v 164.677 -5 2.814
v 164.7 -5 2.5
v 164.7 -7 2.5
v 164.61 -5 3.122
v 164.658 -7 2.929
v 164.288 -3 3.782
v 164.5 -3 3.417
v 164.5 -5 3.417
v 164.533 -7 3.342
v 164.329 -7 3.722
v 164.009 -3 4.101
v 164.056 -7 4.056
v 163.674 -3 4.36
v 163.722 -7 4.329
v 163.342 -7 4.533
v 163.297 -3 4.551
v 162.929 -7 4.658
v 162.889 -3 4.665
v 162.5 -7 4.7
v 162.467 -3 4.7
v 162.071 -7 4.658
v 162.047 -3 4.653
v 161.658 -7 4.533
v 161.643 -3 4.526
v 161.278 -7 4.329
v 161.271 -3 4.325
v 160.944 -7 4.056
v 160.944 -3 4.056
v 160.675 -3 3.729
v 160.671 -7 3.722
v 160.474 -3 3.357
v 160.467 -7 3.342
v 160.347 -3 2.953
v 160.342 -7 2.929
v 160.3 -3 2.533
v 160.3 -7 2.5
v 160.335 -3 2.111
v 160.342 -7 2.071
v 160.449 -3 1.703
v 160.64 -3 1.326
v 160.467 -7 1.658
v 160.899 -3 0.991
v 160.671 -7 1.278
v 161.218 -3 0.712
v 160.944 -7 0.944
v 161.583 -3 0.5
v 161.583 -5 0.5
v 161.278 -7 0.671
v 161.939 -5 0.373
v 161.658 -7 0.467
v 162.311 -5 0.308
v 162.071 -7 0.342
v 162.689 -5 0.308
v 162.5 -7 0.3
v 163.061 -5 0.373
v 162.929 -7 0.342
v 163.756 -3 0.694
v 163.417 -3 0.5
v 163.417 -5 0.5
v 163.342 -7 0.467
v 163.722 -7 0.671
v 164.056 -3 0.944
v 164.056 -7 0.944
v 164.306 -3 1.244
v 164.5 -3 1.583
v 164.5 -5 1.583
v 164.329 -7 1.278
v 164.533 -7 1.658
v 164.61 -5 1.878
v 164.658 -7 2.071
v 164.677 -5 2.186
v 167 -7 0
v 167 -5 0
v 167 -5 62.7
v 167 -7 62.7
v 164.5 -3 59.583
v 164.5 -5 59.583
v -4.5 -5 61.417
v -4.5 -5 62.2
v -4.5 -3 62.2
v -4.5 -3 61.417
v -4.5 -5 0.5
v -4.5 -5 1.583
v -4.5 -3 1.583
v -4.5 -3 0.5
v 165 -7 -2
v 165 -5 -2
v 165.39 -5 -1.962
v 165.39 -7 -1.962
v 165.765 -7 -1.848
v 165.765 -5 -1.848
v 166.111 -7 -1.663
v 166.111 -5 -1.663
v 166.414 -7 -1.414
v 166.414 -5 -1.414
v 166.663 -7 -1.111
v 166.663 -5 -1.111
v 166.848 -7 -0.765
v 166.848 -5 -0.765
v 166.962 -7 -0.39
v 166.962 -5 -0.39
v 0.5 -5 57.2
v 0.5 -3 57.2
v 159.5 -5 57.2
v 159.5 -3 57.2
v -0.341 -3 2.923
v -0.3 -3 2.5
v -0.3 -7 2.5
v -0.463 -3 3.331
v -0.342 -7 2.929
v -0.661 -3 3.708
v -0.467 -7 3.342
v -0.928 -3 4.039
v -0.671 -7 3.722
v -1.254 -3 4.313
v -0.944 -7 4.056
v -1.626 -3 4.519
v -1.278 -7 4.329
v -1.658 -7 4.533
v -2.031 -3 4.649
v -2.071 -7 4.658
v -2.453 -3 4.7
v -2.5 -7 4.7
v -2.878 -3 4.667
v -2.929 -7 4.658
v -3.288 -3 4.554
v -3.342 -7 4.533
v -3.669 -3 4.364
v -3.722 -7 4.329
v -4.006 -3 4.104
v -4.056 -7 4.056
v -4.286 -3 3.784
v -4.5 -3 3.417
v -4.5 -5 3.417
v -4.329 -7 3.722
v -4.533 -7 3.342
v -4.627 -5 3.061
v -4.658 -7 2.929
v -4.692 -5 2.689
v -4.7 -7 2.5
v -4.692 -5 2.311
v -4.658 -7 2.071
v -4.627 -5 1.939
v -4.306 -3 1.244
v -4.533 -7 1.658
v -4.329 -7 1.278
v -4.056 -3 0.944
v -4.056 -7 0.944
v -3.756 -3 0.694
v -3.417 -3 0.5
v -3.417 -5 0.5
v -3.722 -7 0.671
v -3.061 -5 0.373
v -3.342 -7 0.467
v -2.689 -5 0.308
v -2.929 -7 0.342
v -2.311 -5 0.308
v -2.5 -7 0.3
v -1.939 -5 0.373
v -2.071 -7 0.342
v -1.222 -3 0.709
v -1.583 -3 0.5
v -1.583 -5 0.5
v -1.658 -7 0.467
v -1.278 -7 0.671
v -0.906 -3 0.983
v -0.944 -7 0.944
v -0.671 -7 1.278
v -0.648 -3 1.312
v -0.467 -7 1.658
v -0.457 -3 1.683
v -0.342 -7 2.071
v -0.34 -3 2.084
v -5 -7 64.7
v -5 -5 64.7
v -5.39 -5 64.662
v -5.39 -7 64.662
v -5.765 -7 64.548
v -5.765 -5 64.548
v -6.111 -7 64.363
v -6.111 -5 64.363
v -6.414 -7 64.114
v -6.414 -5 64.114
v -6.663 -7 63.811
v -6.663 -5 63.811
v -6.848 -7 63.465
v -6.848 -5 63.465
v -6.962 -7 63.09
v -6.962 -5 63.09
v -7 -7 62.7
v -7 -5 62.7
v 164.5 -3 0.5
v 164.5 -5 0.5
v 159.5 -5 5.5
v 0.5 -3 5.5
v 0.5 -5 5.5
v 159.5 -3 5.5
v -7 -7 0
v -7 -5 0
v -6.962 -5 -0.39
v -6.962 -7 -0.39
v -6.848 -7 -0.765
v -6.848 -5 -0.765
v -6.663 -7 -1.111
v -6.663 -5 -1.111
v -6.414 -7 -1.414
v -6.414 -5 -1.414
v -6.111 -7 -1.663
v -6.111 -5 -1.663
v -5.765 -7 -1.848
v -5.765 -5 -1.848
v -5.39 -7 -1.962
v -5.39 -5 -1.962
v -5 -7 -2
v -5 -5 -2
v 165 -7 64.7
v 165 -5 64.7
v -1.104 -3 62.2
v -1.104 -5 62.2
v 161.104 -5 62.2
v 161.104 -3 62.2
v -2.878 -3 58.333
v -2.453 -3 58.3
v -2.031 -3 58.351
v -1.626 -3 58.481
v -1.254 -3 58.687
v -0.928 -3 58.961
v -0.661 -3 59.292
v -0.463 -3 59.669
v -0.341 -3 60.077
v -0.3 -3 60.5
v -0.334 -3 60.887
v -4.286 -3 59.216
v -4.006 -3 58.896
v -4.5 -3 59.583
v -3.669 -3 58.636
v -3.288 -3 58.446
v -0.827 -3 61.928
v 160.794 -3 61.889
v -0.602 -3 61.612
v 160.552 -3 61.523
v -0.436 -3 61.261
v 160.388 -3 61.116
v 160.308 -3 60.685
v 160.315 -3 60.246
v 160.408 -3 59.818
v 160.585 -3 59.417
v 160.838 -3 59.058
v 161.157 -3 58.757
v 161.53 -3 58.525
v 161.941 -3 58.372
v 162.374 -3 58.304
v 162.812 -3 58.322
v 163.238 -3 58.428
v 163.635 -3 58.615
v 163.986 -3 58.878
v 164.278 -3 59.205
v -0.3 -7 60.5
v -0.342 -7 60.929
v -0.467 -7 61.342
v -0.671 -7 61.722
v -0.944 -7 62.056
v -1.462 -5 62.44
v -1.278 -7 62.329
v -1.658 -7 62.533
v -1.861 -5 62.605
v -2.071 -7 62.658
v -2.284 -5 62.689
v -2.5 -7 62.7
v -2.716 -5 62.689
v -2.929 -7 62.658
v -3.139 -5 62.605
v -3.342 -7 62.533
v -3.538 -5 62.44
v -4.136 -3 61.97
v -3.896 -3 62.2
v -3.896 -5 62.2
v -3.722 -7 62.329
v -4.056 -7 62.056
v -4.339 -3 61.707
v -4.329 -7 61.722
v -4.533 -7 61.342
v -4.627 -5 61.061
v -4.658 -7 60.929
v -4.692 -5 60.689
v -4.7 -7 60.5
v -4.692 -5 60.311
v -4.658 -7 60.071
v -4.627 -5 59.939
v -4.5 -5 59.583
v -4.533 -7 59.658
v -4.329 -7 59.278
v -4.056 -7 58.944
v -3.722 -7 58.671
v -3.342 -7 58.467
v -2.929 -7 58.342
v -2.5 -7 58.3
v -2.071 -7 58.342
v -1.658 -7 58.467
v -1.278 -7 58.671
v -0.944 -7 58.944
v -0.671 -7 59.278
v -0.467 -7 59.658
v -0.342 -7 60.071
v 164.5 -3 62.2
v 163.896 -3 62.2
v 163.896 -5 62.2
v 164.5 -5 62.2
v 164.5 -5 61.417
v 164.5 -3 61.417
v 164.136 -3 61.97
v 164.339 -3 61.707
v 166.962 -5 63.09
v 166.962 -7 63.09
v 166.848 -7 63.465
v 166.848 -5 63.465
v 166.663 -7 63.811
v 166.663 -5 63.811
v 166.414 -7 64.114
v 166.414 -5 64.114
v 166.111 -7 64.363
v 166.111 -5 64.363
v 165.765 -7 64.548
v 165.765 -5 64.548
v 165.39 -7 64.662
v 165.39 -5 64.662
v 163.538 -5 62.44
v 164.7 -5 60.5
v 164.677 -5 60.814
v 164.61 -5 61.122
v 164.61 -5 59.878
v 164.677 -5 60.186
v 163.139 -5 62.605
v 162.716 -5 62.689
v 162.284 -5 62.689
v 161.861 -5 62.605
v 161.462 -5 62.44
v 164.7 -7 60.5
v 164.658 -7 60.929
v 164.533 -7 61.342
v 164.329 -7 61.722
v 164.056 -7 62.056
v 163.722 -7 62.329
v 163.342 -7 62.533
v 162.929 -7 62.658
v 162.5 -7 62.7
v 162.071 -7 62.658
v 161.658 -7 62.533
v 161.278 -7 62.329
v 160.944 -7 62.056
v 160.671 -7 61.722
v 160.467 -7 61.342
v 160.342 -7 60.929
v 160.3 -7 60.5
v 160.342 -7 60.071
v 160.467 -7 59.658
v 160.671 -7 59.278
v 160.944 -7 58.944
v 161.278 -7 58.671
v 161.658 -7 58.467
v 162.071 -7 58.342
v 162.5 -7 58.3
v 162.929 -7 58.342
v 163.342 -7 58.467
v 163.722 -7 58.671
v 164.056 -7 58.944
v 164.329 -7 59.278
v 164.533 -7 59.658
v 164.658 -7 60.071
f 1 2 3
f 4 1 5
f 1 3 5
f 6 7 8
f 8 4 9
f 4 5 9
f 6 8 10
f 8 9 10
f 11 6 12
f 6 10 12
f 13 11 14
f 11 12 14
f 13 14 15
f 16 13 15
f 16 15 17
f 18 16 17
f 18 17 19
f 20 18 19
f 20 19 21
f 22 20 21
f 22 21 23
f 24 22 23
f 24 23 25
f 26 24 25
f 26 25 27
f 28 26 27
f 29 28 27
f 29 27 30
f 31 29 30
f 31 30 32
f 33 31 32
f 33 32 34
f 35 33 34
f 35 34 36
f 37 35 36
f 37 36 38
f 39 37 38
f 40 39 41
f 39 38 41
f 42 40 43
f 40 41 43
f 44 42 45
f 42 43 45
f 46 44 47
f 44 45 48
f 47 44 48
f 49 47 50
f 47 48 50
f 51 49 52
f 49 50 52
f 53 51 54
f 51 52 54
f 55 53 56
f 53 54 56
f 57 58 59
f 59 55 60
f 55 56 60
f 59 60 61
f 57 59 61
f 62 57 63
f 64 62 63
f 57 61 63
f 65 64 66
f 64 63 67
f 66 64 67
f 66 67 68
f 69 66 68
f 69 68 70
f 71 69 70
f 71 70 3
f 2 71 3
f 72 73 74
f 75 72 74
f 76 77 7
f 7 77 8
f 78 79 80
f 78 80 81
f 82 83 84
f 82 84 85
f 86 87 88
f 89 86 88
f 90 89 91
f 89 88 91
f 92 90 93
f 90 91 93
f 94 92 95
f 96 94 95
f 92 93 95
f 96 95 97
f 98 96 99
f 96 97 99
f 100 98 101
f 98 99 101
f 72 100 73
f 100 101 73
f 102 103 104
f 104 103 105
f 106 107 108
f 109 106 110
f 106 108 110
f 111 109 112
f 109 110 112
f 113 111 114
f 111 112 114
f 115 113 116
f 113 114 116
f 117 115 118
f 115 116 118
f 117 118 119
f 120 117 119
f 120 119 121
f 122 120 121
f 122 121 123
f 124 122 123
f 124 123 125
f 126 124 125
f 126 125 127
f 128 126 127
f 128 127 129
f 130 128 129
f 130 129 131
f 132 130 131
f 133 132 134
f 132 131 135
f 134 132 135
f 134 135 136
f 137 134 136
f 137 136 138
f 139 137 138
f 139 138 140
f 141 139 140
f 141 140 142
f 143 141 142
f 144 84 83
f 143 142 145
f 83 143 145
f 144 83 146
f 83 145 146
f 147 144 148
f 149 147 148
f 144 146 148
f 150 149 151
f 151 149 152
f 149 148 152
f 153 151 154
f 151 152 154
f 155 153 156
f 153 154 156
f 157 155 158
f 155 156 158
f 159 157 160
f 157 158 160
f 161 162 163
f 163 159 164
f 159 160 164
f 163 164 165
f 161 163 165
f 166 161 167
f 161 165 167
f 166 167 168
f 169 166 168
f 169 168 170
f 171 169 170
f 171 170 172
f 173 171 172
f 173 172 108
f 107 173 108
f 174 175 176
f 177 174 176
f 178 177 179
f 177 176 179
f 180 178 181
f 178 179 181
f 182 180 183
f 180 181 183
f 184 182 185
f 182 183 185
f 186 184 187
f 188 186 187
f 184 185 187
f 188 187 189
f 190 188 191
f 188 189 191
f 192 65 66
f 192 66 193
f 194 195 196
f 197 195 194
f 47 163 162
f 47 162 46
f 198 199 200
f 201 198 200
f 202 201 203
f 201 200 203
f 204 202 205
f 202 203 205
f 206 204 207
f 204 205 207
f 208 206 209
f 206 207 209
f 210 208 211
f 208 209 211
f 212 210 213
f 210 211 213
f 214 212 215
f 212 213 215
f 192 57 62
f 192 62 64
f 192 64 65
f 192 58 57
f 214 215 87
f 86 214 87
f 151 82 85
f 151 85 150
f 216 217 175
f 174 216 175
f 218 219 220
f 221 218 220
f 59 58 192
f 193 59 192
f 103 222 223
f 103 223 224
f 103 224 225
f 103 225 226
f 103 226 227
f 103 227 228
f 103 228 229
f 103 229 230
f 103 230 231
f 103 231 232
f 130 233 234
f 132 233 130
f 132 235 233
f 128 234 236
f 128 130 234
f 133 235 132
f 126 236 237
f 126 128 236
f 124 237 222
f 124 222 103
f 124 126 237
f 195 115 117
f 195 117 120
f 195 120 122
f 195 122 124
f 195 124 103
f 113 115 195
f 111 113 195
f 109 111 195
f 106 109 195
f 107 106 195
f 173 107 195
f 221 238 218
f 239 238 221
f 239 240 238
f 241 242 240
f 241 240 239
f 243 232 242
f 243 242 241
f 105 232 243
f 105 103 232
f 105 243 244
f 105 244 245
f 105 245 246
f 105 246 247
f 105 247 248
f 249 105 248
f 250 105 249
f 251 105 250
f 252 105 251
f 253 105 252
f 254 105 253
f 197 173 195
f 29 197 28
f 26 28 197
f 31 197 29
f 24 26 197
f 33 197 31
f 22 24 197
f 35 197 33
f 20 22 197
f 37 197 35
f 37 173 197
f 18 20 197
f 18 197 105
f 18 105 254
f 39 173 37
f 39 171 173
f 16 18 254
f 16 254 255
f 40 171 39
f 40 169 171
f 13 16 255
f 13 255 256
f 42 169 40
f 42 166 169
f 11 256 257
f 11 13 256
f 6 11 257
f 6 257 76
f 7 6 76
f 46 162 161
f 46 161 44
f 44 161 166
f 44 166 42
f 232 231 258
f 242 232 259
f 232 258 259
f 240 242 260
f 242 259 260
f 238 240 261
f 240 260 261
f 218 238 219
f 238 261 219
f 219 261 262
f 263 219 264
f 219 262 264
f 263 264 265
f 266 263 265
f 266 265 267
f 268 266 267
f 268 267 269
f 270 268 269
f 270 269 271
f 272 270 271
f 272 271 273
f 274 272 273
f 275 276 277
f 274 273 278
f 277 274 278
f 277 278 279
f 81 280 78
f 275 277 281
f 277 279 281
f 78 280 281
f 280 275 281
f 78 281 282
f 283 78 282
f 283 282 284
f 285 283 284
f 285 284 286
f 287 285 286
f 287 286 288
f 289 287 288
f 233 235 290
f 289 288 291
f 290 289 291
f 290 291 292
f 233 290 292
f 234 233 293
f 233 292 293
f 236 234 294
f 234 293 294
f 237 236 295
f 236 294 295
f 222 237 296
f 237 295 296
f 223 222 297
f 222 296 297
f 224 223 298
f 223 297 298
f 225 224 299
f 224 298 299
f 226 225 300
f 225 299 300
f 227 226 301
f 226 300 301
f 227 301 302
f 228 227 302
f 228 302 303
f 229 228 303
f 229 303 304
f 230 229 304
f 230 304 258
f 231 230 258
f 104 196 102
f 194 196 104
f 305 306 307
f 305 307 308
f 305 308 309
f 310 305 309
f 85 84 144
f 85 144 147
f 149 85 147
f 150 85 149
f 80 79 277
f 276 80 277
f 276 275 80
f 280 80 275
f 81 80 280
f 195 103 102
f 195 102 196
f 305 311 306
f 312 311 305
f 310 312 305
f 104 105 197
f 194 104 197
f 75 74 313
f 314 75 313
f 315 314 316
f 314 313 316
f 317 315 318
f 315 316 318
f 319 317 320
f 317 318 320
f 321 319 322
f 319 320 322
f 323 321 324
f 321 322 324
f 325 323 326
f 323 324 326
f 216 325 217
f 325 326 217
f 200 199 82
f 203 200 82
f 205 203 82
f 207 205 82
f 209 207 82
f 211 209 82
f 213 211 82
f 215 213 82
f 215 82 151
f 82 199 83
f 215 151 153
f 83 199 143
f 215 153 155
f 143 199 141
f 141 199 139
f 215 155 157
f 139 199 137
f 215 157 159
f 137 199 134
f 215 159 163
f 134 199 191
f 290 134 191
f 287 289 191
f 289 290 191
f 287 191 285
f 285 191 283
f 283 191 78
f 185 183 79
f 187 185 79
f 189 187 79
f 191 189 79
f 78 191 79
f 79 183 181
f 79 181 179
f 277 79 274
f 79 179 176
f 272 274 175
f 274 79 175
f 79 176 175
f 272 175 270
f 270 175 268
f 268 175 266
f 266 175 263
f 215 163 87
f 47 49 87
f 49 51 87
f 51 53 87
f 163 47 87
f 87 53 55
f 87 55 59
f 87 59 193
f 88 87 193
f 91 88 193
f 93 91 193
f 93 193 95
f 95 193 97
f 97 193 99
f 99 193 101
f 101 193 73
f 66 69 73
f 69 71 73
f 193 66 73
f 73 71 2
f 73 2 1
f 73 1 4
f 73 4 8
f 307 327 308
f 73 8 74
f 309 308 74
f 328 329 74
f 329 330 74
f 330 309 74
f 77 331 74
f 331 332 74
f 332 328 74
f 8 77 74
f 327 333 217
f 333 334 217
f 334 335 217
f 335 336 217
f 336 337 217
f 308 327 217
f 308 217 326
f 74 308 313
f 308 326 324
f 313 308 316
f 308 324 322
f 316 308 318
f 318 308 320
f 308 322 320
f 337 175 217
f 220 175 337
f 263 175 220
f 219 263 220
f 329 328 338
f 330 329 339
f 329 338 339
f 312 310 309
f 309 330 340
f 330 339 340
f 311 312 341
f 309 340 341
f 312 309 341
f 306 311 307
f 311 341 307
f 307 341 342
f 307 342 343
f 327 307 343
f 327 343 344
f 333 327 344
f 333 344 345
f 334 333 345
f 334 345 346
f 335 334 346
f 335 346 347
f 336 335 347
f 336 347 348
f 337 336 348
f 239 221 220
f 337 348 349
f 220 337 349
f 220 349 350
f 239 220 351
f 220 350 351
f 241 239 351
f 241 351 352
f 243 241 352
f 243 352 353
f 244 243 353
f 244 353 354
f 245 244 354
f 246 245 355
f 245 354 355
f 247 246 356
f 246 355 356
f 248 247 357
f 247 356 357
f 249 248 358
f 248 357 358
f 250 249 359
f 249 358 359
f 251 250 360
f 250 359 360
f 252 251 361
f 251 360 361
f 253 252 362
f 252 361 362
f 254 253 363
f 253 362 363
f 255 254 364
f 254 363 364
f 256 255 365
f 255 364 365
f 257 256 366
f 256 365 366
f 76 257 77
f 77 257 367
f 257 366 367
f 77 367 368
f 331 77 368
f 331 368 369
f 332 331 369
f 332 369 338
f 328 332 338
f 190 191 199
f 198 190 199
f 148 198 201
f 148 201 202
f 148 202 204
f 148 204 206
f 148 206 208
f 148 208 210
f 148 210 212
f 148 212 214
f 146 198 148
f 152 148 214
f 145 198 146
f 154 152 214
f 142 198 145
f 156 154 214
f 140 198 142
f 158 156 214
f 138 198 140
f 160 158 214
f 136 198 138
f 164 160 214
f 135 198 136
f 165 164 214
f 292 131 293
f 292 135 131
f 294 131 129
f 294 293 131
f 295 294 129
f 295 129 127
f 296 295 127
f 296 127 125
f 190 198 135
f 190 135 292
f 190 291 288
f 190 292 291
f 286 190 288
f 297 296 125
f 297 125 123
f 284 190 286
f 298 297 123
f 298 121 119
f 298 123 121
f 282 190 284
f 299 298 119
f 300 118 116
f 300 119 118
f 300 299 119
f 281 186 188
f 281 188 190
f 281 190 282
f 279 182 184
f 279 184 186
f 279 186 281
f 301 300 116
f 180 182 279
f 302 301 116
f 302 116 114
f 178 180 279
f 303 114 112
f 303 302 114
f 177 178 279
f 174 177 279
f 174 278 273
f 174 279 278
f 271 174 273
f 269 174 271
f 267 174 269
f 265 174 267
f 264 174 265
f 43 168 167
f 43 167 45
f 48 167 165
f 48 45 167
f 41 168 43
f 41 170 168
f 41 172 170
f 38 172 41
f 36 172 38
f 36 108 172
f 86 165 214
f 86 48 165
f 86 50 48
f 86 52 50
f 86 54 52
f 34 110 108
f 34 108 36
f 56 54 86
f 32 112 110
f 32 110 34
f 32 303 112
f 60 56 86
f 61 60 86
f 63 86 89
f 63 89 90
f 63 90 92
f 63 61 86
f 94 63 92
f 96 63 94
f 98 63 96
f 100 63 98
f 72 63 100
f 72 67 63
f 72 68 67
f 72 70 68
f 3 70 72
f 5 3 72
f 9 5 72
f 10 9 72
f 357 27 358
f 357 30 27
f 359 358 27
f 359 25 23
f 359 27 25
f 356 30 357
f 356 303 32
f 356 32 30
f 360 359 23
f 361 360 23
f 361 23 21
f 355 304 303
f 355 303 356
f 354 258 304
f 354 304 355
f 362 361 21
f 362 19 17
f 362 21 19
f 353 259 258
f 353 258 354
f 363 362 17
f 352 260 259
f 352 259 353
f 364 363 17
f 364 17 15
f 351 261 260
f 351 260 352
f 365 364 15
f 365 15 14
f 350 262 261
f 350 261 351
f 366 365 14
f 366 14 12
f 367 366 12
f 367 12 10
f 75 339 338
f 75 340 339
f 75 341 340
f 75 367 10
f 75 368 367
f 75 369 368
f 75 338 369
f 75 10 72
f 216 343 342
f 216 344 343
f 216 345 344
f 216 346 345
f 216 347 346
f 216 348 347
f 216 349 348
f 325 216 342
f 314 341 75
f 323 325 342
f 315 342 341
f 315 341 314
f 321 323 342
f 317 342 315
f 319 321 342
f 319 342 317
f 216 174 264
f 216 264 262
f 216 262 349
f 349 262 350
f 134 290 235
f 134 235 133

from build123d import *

# Parameters (mm, degrees)
PAD004_DEPTH    = 2
SKETCH008_W     = 169
SKETCH008_H     = 61.7
PAD005_DEPTH    = 2
SKETCH009_R     = 2.2
POCKET002_DEPTH = 4.001
SKETCH012_W     = 159
SKETCH012_H     = 51.7
POCKET005_DEPTH = 2


with BuildPart() as part:
    # Sketch007 → Pad004 (new body)
    with BuildSketch(Plane.XZ):
        with BuildLine():
            Line((-2, 62.7), (-2, 0))
            ThreePointArc((-2, 0), (-1.414214, -1.414214), (0, -2))
            Line((0, -2), (170, -2))
            ThreePointArc((170, -2), (171.414214, -1.414214), (172, 0))
            Line((172, 0), (172, 62.7))
            ThreePointArc((172, 62.7), (171.414214, 64.114214), (170, 64.7))
            Line((170, 64.7), (0, 64.7))
            ThreePointArc((0, 64.7), (-1.414214, 64.114214), (-2, 62.7))
        make_face()
    extrude(amount=PAD004_DEPTH)

    # Sketch008 (on Face9 of Pad004) → Pad005 (join)
    with BuildSketch(Plane(origin=(0, 0, 0), x_dir=(1, 0, 0), z_dir=(0, 1, 0))):
        with Locations((85, -31.35)):
            Rectangle(SKETCH008_W, SKETCH008_H)
    extrude(amount=PAD005_DEPTH)

    # Sketch009 (on Face5 of Pad005) → Pocket002 (cut, through all)
    with BuildSketch(Plane.XZ.offset(2)):
        with Locations((2.5, 2.5)):
            Circle(SKETCH009_R)
        with Locations((2.5, 60.5)):
            Circle(SKETCH009_R)
        with Locations((167.5, 60.5)):
            Circle(SKETCH009_R)
        with Locations((167.5, 2.5)):
            Circle(SKETCH009_R)
    extrude(amount=-POCKET002_DEPTH, mode=Mode.SUBTRACT)

    # Sketch012 (on Face28 of Pocket002) → Pocket005 (cut)
    with BuildSketch(Plane(origin=(0, 2, 0), x_dir=(1, 0, 0), z_dir=(0, 1, 0))):
        with Locations((85, -31.35)):
            Rectangle(SKETCH012_W, SKETCH012_H)
    extrude(amount=-POCKET005_DEPTH, mode=Mode.SUBTRACT)


with BuildPart() as part_1:
    # Body003 placement: moved
    add(part.part.moved(Location((-5, -5, 0))))


solid = part_1.part
